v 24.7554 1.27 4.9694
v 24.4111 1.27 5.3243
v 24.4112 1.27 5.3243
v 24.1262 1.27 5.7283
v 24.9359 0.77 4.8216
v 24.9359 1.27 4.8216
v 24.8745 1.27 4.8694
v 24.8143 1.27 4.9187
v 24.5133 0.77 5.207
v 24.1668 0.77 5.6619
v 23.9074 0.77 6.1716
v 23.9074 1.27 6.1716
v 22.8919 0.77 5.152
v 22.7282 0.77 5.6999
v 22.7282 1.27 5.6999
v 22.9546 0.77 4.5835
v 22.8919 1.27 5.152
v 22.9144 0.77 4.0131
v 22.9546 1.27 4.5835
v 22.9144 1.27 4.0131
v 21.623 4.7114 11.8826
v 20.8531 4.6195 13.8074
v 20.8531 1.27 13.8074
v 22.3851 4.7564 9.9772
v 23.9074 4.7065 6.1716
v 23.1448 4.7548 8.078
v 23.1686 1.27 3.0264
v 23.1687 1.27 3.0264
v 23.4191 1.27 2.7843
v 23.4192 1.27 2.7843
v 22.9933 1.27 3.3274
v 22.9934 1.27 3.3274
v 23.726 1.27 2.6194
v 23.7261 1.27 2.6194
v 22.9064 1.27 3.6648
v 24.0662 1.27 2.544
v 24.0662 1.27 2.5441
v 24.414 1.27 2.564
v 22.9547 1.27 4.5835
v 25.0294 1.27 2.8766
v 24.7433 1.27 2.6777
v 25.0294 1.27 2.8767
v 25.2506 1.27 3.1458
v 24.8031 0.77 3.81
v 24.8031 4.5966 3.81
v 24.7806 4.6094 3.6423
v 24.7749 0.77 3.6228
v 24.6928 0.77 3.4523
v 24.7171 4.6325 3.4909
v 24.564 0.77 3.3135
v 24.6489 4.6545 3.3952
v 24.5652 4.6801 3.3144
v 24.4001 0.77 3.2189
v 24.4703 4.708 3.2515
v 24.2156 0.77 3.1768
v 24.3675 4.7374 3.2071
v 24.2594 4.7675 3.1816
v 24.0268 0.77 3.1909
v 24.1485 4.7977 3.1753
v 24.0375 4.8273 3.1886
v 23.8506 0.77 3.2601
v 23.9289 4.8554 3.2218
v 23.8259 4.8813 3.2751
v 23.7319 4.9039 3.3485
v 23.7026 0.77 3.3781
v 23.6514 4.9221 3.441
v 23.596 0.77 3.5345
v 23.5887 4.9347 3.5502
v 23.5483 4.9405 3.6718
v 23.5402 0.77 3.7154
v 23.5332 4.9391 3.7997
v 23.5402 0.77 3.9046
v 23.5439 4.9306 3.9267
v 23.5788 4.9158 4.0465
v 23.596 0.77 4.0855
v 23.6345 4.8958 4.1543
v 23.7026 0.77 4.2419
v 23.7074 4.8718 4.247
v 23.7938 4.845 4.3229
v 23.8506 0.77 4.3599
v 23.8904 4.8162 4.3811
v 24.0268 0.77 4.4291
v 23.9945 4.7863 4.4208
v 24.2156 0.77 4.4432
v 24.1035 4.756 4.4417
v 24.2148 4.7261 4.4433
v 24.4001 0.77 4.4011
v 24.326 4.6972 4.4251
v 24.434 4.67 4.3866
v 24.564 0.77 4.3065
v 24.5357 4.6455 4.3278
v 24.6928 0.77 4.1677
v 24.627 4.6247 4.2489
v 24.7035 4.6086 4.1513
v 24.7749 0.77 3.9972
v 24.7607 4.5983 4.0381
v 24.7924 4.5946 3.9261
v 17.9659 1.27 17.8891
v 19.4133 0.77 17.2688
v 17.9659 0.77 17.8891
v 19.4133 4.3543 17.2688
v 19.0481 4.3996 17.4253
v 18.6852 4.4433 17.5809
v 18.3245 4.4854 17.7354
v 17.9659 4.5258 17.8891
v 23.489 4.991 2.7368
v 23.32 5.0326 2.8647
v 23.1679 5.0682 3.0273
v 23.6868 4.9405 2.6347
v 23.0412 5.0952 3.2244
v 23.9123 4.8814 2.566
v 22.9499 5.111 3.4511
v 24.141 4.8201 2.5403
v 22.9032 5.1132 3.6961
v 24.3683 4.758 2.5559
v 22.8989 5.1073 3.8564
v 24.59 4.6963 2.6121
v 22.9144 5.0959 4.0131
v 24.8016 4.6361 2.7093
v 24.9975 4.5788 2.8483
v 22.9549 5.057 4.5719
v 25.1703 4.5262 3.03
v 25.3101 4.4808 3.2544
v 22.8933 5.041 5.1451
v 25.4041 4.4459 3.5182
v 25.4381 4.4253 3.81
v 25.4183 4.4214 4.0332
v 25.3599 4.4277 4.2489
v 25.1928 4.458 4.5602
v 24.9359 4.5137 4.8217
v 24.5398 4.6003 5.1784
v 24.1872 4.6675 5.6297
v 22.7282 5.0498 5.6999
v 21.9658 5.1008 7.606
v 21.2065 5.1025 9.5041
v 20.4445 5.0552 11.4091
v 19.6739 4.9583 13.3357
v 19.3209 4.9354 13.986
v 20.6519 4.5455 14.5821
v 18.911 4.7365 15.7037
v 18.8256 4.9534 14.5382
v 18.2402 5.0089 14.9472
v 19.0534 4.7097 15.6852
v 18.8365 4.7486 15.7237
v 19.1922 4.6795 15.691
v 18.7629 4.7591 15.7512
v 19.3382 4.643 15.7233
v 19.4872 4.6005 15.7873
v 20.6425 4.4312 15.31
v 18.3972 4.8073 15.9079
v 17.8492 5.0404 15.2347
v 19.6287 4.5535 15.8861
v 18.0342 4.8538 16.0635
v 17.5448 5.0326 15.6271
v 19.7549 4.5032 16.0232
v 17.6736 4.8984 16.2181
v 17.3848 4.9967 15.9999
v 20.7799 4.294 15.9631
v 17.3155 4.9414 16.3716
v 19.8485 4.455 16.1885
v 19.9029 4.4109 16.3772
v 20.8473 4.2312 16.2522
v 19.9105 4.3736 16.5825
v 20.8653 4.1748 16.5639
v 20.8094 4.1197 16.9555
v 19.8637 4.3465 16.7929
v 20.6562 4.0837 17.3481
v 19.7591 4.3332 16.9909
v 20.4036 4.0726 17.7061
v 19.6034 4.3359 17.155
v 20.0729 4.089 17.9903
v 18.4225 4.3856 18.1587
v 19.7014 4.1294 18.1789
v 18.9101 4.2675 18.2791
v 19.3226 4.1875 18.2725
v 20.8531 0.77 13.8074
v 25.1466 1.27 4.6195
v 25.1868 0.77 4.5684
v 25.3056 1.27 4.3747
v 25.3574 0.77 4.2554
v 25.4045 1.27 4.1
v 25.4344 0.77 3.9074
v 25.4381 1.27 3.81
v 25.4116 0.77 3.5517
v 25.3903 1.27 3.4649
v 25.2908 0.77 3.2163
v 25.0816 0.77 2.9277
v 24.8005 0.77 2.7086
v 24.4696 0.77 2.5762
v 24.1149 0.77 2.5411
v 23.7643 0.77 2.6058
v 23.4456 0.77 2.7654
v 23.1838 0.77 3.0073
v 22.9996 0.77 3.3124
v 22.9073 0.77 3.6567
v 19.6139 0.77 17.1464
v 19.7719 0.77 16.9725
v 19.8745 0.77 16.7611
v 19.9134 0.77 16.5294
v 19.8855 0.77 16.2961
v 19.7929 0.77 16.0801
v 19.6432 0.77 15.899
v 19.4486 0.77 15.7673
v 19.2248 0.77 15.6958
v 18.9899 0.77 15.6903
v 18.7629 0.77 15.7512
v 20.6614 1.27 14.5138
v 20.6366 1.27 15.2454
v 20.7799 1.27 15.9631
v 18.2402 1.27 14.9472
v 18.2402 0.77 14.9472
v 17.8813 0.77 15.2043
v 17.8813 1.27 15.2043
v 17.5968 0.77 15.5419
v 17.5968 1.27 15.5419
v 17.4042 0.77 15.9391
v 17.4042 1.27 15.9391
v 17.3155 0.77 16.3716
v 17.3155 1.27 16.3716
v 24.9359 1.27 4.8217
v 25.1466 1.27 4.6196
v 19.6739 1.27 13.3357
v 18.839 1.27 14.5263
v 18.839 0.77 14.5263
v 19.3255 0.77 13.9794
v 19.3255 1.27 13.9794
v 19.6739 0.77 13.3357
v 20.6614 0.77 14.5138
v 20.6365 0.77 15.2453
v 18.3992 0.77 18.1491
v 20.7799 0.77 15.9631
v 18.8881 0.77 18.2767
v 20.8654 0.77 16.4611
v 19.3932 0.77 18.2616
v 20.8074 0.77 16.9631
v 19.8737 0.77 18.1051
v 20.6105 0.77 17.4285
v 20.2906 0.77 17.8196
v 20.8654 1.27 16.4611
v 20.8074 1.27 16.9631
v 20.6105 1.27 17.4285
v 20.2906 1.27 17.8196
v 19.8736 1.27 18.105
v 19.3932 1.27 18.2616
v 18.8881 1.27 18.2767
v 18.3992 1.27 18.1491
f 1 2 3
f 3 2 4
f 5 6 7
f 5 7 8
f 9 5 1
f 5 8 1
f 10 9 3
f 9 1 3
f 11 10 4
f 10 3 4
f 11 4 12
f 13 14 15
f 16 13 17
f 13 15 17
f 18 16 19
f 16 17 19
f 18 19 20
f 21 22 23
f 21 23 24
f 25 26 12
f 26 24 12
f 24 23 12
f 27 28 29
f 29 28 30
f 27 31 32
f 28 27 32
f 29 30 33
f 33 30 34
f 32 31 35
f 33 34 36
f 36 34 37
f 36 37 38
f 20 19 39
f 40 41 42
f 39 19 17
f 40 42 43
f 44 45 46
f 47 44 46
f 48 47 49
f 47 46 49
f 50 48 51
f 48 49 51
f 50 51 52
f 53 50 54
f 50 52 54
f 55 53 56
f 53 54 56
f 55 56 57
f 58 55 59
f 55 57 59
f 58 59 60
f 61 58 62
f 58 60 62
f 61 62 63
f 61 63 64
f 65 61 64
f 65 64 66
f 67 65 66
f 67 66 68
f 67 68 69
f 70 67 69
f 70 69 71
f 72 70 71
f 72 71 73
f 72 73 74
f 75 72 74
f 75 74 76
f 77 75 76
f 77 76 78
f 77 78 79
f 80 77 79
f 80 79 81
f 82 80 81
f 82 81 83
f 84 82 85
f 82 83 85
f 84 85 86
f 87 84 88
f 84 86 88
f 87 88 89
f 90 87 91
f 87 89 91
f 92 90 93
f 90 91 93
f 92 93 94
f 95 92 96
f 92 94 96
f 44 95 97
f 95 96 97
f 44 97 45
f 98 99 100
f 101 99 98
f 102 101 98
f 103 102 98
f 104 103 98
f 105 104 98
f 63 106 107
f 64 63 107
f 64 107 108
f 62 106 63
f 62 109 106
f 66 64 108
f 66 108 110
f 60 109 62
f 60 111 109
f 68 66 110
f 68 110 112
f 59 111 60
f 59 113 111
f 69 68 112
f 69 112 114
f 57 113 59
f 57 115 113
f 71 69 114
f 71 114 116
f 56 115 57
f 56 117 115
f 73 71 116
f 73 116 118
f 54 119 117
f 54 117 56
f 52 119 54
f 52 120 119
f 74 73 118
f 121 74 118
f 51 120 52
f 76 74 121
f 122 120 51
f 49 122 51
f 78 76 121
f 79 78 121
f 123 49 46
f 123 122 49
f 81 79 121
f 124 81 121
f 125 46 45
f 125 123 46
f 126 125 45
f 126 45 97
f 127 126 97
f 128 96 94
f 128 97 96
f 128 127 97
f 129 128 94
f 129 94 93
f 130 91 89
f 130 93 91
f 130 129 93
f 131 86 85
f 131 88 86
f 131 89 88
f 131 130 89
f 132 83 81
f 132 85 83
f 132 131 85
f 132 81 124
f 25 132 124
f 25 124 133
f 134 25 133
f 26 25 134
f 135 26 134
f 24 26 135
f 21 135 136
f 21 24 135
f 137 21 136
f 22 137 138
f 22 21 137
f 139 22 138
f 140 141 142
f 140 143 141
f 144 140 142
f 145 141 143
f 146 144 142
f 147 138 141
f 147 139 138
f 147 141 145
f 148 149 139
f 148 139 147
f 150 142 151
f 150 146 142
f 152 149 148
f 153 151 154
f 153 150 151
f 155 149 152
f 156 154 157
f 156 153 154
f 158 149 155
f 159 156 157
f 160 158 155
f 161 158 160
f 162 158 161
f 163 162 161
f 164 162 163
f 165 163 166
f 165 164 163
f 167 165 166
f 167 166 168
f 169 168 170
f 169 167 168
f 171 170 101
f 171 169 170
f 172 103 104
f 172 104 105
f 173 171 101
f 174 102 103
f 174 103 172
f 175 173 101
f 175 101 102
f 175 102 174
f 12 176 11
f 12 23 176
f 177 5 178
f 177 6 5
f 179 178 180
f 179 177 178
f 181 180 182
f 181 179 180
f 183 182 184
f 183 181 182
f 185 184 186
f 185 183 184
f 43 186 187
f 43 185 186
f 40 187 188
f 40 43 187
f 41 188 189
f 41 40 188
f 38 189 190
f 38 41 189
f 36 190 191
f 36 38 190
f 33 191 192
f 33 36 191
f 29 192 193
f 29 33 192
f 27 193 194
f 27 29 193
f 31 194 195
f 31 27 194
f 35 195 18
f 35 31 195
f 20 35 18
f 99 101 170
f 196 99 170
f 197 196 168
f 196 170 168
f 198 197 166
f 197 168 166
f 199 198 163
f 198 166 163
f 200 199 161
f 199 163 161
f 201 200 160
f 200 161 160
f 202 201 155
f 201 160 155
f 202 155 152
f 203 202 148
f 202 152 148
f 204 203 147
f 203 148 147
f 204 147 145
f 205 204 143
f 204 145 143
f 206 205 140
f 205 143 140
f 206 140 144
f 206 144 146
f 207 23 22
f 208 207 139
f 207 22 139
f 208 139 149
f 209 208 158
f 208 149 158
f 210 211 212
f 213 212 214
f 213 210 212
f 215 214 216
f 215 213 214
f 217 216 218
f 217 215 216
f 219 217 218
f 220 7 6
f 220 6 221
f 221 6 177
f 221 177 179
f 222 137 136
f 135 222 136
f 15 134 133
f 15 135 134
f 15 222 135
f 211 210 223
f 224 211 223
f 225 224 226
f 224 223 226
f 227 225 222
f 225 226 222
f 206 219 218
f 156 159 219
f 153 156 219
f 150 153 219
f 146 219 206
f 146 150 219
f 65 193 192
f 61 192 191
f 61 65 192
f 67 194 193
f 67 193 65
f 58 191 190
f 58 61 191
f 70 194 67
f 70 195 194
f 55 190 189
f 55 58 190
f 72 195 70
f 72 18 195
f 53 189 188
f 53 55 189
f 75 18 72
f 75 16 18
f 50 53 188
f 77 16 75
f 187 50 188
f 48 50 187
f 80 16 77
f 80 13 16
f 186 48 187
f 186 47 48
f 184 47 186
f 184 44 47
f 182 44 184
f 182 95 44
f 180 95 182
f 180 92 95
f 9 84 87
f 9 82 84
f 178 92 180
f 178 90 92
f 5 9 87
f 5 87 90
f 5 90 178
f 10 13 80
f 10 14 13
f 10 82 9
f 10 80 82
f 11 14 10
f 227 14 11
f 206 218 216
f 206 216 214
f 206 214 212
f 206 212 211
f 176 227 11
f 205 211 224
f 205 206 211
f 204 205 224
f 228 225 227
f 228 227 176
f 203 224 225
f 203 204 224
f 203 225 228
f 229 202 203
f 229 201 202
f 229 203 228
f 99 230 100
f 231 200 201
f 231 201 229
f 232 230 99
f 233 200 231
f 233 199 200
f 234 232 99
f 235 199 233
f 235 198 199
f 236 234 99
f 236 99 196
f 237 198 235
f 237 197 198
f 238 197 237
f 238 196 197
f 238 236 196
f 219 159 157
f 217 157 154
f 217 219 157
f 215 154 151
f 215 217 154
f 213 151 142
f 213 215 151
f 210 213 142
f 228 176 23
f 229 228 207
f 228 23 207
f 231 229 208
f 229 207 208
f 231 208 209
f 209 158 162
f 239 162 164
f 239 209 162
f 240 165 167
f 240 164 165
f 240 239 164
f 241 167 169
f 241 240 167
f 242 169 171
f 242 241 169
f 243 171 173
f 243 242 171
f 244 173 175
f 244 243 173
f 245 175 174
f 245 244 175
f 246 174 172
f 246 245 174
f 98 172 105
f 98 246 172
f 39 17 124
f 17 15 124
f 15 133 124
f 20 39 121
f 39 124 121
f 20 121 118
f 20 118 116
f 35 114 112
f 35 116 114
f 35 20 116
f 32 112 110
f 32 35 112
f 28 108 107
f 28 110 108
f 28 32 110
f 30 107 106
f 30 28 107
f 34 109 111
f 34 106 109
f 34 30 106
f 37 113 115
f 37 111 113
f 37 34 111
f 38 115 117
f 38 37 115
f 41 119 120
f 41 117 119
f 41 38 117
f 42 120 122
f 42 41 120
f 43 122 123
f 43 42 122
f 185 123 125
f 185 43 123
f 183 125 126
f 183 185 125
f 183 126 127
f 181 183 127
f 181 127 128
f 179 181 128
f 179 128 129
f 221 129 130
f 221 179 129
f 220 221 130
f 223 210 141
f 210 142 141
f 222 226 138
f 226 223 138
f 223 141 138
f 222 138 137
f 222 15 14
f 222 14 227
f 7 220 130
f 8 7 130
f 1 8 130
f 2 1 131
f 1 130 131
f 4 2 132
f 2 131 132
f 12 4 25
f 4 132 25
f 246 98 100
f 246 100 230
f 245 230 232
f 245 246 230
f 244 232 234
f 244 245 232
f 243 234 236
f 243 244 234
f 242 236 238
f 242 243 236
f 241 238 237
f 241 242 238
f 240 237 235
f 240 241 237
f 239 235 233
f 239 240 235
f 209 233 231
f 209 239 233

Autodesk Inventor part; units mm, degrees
ref_plane "YZ Plane" through (0, 0, 0) normal (1, 0, 0) x (0, 1, 0)
ref_plane "XZ Plane" through (0, 0, 0) normal (0, 1, 0) x (-1, 0, 0)
sketch "Sketch1" plane through (0, 0, 0) normal (0, 0, 1) x (1, 0, 0)
  line L0 (0, 0) -> (0, 8.6646) construction
  line L1 (20.9931, 1.27) -> (20.9931, 5.715)
  line L2 (20.9931, 5.715) -> (27.9781, 3.81)
  line L3 (27.9781, 3.81) -> (27.9781, 0)
  line L4 (27.9781, 0) -> (20.9931, 0)
  line L5 (20.9931, 1.27) -> (18.4531, 1.27)
  line L6 (18.4531, 1.27) -> (18.4531, 0)
  line L7 (18.4531, 0) -> (20.9931, 0)
  dimension "d0" = 20.9931
  dimension "d1" = 4.445
  dimension "d2" = 1.27
  dimension "d3" = 2.54
  dimension "d4" = 3.81
  dimension "d5" = 6.985
revolve "Revolution1" add sketch "Sketch1" angle 360 about axis through (0, 0, 0) along (0, 1, 0)
ref_plane "Work Plane1" through (0, 3.81, 0) normal (0, 1, 0) x (1, 0, 0)
sketch "Sketch2" plane through (0, 0, 0) normal (0, -1, 0) x (1, 0, 0)
  line L0 (0, 0) -> (-45.8206, 0) construction
  circle A0 centre (0, 0) radius 27.9781 projected
  line L1 (-27.6227, 4.445) -> (-30.5181, 2.54)
  line L2 (-30.5181, 2.54) -> (-30.5181, -2.54)
  line L3 (-30.5181, -2.54) -> (-27.6227, -4.445)
  dimension "d7" = 2.54
  dimension "d8" = 8.89
  dimension "d9" = 5.08
extrude "Extrusion1" add sketch "Sketch2" against normal up to surface (3.81 mm away) contours A0 L3 L2 L1
pattern_circular "Circular Pattern1" count 12 over 360 about axis through (0, 1.905, 0) along (0, -1, 0) of "Extrusion1"
sketch "Sketch3" plane through (0, 1.27, 0) normal (0, 1, 0) x (1, 0, 0)
  circle A0 centre (0, 0) radius 18.4531 projected
  circle A1 centre (0, 0) radius 18.4531 projected
  circle A2 centre (0, 0) radius 20.9931 projected
  circle A3 centre (0, 0) radius 20.9931 projected
  arc A4 (-26.1445, 9.9619) -> (-27.6227, 4.445) centre (0, 0) ccw projected
  arc A5 (-27.6227, 4.445) -> (-27.6227, -4.445) centre (0, 0) ccw projected
  arc A6 (-27.6227, -4.445) -> (-26.1445, -9.9619) centre (0, 0) ccw projected
  arc A7 (-26.1445, -9.9619) -> (-21.6995, -17.6609) centre (0, 0) ccw projected
  arc A8 (-21.6995, -17.6609) -> (-17.6609, -21.6995) centre (0, 0) ccw projected
  arc A9 (-17.6609, -21.6995) -> (-9.9619, -26.1445) centre (0, 0) ccw projected
  arc A10 (-9.9619, -26.1445) -> (-4.445, -27.6227) centre (0, 0) ccw projected
  arc A11 (-4.445, -27.6227) -> (4.445, -27.6227) centre (0, 0) ccw projected
  arc A12 (4.445, -27.6227) -> (9.9619, -26.1445) centre (0, 0) ccw projected
  arc A13 (9.9619, -26.1445) -> (17.6609, -21.6995) centre (0, 0) ccw projected
  arc A14 (17.6609, -21.6995) -> (21.6995, -17.6609) centre (0, 0) ccw projected
  arc A15 (21.6995, -17.6609) -> (26.1445, -9.9619) centre (0, 0) ccw projected
  arc A16 (26.1445, -9.9619) -> (27.6227, -4.445) centre (0, 0) ccw projected
  arc A17 (27.6227, -4.445) -> (27.6227, 4.445) centre (0, 0) ccw projected
  arc A18 (27.6227, 4.445) -> (26.1445, 9.9619) centre (0, 0) ccw projected
  arc A19 (26.1445, 9.9619) -> (21.6995, 17.6609) centre (0, 0) ccw projected
  arc A20 (21.6995, 17.6609) -> (17.6609, 21.6995) centre (0, 0) ccw projected
  arc A21 (17.6609, 21.6995) -> (9.9619, 26.1445) centre (0, 0) ccw projected
  arc A22 (9.9619, 26.1445) -> (4.445, 27.6227) centre (0, 0) ccw projected
  arc A23 (4.445, 27.6227) -> (-4.445, 27.6227) centre (0, 0) ccw projected
  arc A24 (-4.445, 27.6227) -> (-9.9619, 26.1445) centre (0, 0) ccw projected
  arc A25 (-9.9619, 26.1445) -> (-17.6609, 21.6995) centre (0, 0) ccw projected
  arc A26 (-17.6609, 21.6995) -> (-21.6995, 17.6609) centre (0, 0) ccw projected
  arc A27 (-21.6995, 17.6609) -> (-26.1445, 9.9619) centre (0, 0) ccw projected
  circle A28 centre (0, 0) radius 22.8981
  spline S0 degree 2 poles (-20.4865, -10.8927) (-20.2314, -10.7347) (-20.0767, -10.9844) knots 0 0 0 1 1 1
  spline S1 degree 2 poles (-20.0767, -10.9844) (-19.9219, -11.2342) (-20.177, -11.3922) knots 0 0 0 1 1 1
  line L0 (-20.177, -11.3922) -> (-22.4984, -12.8306)
  line L1 (-22.4984, -12.8306) -> (-21.0657, -12.8234)
  spline S2 degree 2 poles (-21.0657, -12.8234) (-20.8353, -12.8371) (-20.7343, -13.0001) knots 0 0 0 1 1 1
  spline S3 degree 2 poles (-20.7343, -13.0001) (-20.6366, -13.1578) (-20.7235, -13.3463) knots 0 0 0 1 1 1
  line L2 (-20.7235, -13.3463) -> (-21.4078, -14.6436)
  line L3 (-21.4078, -14.6436) -> (-19.0627, -13.1905)
  spline S4 degree 2 poles (-19.0627, -13.1905) (-18.8077, -13.0325) (-18.6529, -13.2822) knots 0 0 0 1 1 1
  spline S5 degree 2 poles (-18.6529, -13.2822) (-18.4949, -13.5373) (-18.7499, -13.6953) knots 0 0 0 1 1 1
  line L4 (-18.7499, -13.6953) -> (-21.6577, -15.497)
  spline S6 degree 2 poles (-21.6577, -15.497) (-21.9259, -15.6631) (-22.0936, -15.3923) knots 0 0 0 1 1 1
  spline S7 degree 2 poles (-22.0936, -15.3923) (-22.2093, -15.2057) (-22.1246, -15.0076) knots 0 0 0 1 1 1
  line L5 (-22.1246, -15.0076) -> (-21.3965, -13.3994)
  line L6 (-21.3965, -13.3994) -> (-23.1279, -13.3298)
  spline S8 degree 2 poles (-23.1279, -13.3298) (-23.414, -13.3142) (-23.5248, -13.1355) knots 0 0 0 1 1 1
  spline S9 degree 2 poles (-23.5248, -13.1355) (-23.5932, -13.025) (-23.5178, -12.7709) (-23.3942, -12.6944) knots 0 0 0 1 2 2 2
  line L7 (-23.3942, -12.6944) -> (-20.4865, -10.8927)
  line L8 (-21.4115, -8.1592) -> (-20.6563, -9.942)
  line L9 (-20.6563, -9.942) -> (-23.6894, -11.2268)
  line L10 (-23.6894, -11.2268) -> (-24.4445, -9.444)
  spline S10 degree 2 poles (-24.4445, -9.444) (-24.5591, -9.1734) (-24.2914, -9.06) knots 0 0 0 1 1 1
  spline S11 degree 2 poles (-24.2914, -9.06) (-24.0209, -8.9454) (-23.9063, -9.216) knots 0 0 0 1 1 1
  line L11 (-23.9063, -9.216) -> (-23.3743, -10.4719)
  line L12 (-23.3743, -10.4719) -> (-22.8189, -10.2367)
  line L13 (-22.8189, -10.2367) -> (-23.3171, -9.0605)
  spline S12 degree 2 poles (-23.3171, -9.0605) (-23.4293, -8.7956) (-23.1616, -8.6822) knots 0 0 0 1 1 1
  spline S13 degree 2 poles (-23.1616, -8.6822) (-22.8854, -8.5652) (-22.7732, -8.8301) knots 0 0 0 1 1 1
  line L14 (-22.7732, -8.8301) -> (-22.275, -10.0063)
  line L15 (-22.275, -10.0063) -> (-21.4235, -9.6456)
  line L16 (-21.4235, -9.6456) -> (-21.9554, -8.3897)
  spline S14 degree 2 poles (-21.9554, -8.3897) (-22.07, -8.1191) (-21.8023, -8.0057) knots 0 0 0 1 1 1
  spline S15 degree 2 poles (-21.8023, -8.0057) (-21.5261, -7.8887) (-21.4115, -8.1592) knots 0 0 0 1 1 1
  spline S16 degree 2 poles (-22.8056, -5.2377) (-22.4484, -5.3877) (-22.1014, -5.7752) (-22.015, -6.0818) knots 0 0 0 1 2 2 2
  spline S17 degree 2 poles (-22.015, -6.0818) (-21.8732, -6.5849) (-22.313, -7.0655) knots 0 0 0 1 1 1
  spline S18 degree 2 poles (-22.313, -7.0655) (-22.5945, -7.4918) (-23.3387, -7.7016) knots 0 0 0 1 1 1
  spline S19 degree 2 poles (-23.3387, -7.7016) (-24.1544, -7.9314) (-24.69, -7.6614) knots 0 0 0 1 1 1
  spline S20 degree 2 poles (-24.69, -7.6614) (-25.1213, -7.4423) (-25.2479, -6.9928) knots 0 0 0 1 1 1
  spline S21 degree 2 poles (-25.2479, -6.9928) (-25.3444, -6.6505) (-25.2198, -6.1462) (-24.9563, -5.8953) knots 0 0 0 1 2 2 2
  spline S22 degree 2 poles (-24.9563, -5.8953) (-24.9018, -5.8381) (-24.8303, -5.818) knots 0 0 0 1 1 1
  spline S23 degree 2 poles (-24.8303, -5.818) (-24.7112, -5.7844) (-24.4997, -5.908) (-24.4678, -6.0211) knots 0 0 0 1 2 2 2
  spline S24 degree 2 poles (-24.4678, -6.0211) (-24.4242, -6.1759) (-24.5806, -6.3164) knots 0 0 0 1 1 1
  spline S25 degree 2 poles (-24.5806, -6.3164) (-24.7683, -6.517) (-24.6827, -6.8207) knots 0 0 0 1 1 1
  spline S26 degree 2 poles (-24.6827, -6.8207) (-24.6139, -7.0648) (-24.3475, -7.1664) knots 0 0 0 1 1 1
  spline S27 degree 2 poles (-24.3475, -7.1664) (-24.0157, -7.2947) (-23.4948, -7.1479) knots 0 0 0 1 1 1
  spline S28 degree 2 poles (-23.4948, -7.1479) (-23.0095, -7.0111) (-22.5148, -6.4861) (-22.587, -6.2301) knots 0 0 0 1 2 2 2
  spline S29 degree 2 poles (-22.587, -6.2301) (-22.6767, -5.9116) (-22.9983, -5.774) knots 0 0 0 1 1 1
  spline S30 degree 2 poles (-22.9983, -5.774) (-23.1807, -5.7194) (-23.2168, -5.5914) knots 0 0 0 1 1 1
  spline S31 degree 2 poles (-23.2168, -5.5914) (-23.2487, -5.4783) (-23.1196, -5.2523) (-23.0064, -5.2204) knots 0 0 0 1 2 2 2
  spline S32 degree 2 poles (-23.0064, -5.2204) (-22.9082, -5.1928) (-22.8056, -5.2377) knots 0 0 0 1 1 1
  spline S33 degree 2 poles (-23.0841, -2.194) (-22.7873, -2.1504) (-22.7455, -2.435) knots 0 0 0 1 1 1
  spline S34 degree 2 poles (-22.7455, -2.435) (-22.7028, -2.7257) (-22.9996, -2.7693) knots 0 0 0 1 1 1
  line L17 (-22.9996, -2.7693) -> (-24.1563, -2.9392)
  line L18 (-24.1563, -2.9392) -> (-23.9877, -4.0867)
  line L19 (-23.9877, -4.0867) -> (-22.8311, -3.9168)
  spline S35 degree 2 poles (-22.8311, -3.9168) (-22.5342, -3.8732) (-22.4915, -4.1639) knots 0 0 0 1 1 1
  spline S36 degree 2 poles (-22.4915, -4.1639) (-22.4488, -4.4546) (-22.7456, -4.4982) knots 0 0 0 1 1 1
  line L20 (-22.7456, -4.4982) -> (-25.4599, -4.8969)
  spline S37 degree 2 poles (-25.4599, -4.8969) (-25.7536, -4.9401) (-25.7963, -4.6494) knots 0 0 0 1 1 1
  spline S38 degree 2 poles (-25.7963, -4.6494) (-25.839, -4.3587) (-25.5453, -4.3155) knots 0 0 0 1 1 1
  line L21 (-25.5453, -4.3155) -> (-24.5722, -4.1726)
  line L22 (-24.5722, -4.1726) -> (-24.7408, -3.0251)
  line L23 (-24.7408, -3.0251) -> (-25.7139, -3.168)
  spline S39 degree 2 poles (-25.7139, -3.168) (-26.0076, -3.2112) (-26.0503, -2.9205) knots 0 0 0 1 1 1
  spline S40 degree 2 poles (-26.0503, -2.9205) (-26.0921, -2.6359) (-25.7984, -2.5928) knots 0 0 0 1 1 1
  line L24 (-25.7984, -2.5928) -> (-23.0841, -2.194)
  spline S41 degree 2 poles (-23.2836, 1.208) (-23.2064, 1.2364) (-23.1539, 1.2367) knots 0 0 0 1 1 1
  spline S42 degree 2 poles (-23.1539, 1.2367) (-23.0302, 1.2375) (-22.8651, 1.053) (-22.8643, 0.9323) knots 0 0 0 1 2 2 2
  spline S43 degree 2 poles (-22.8643, 0.9323) (-22.8631, 0.7437) (-23.042, 0.6683) knots 0 0 0 1 1 1
  line L25 (-23.042, 0.6683) -> (-23.4523, 0.5049)
  line L26 (-23.4523, 0.5049) -> (-23.4439, -0.8127)
  line L27 (-23.4439, -0.8127) -> (-23.0192, -0.9677)
  spline S44 degree 2 poles (-23.0192, -0.9677) (-22.8518, -1.0347) (-22.8505, -1.2295) knots 0 0 0 1 1 1
  spline S45 degree 2 poles (-22.8505, -1.2295) (-22.8498, -1.3439) (-23.0064, -1.5305) (-23.1301, -1.5313) knots 0 0 0 1 2 2 2
  spline S46 degree 2 poles (-23.1301, -1.5313) (-23.1826, -1.5316) (-23.2322, -1.5134) knots 0 0 0 1 1 1
  line L28 (-23.2322, -1.5134) -> (-26.0565, -0.4767)
  spline S47 degree 2 poles (-26.0565, -0.4767) (-26.2212, -0.3571) (-26.2222, -0.1963) knots 0 0 0 1 1 1
  spline S48 degree 2 poles (-26.2222, -0.1963) (-26.2233, -0.0262) (-26.0632, 0.0924) knots 0 0 0 1 1 1
  line L29 (-26.0632, 0.0924) -> (-23.2836, 1.208)
  line L30 (-24.0233, 0.3126) -> (-25.2852, -0.1749)
  line L31 (-25.2852, -0.1749) -> (-24.0173, -0.6307)
  line L32 (-24.0173, -0.6307) -> (-24.0233, 0.3126)
  spline S49 degree 2 poles (-22.7917, 4.2665) (-22.4883, 4.2255) (-22.5223, 3.9742) knots 0 0 0 1 1 1
  spline S50 degree 2 poles (-22.5223, 3.9742) (-22.5451, 3.8056) (-22.7963, 3.7022) knots 0 0 0 1 1 1
  line L33 (-22.7963, 3.7022) -> (-24.9996, 2.6644)
  line L34 (-24.9996, 2.6644) -> (-23.038, 2.3991)
  spline S51 degree 2 poles (-23.038, 2.3991) (-22.7407, 2.3589) (-22.7793, 2.0739) knots 0 0 0 1 1 1
  spline S52 degree 2 poles (-22.7793, 2.0739) (-22.8178, 1.7888) (-23.1151, 1.8291) knots 0 0 0 1 1 1
  line L35 (-23.1151, 1.8291) -> (-25.8582, 2.2)
  spline S53 degree 2 poles (-25.8582, 2.2) (-26.1463, 2.239) (-26.109, 2.5148) knots 0 0 0 1 1 1
  spline S54 degree 2 poles (-26.109, 2.5148) (-26.0867, 2.6803) (-25.9475, 2.6709) knots 0 0 0 1 1 1
  line L36 (-25.9475, 2.6709) -> (-23.6718, 3.805)
  line L37 (-23.6718, 3.805) -> (-25.5813, 4.0632)
  spline S55 degree 2 poles (-25.5813, 4.0632) (-25.8755, 4.103) (-25.837, 4.3881) knots 0 0 0 1 1 1
  spline S56 degree 2 poles (-25.837, 4.3881) (-25.7984, 4.6731) (-25.5042, 4.6333) knots 0 0 0 1 1 1
  line L38 (-25.5042, 4.6333) -> (-22.7917, 4.2665)
  spline S57 degree 2 poles (-22.4654, 5.6266) (-22.1736, 5.5569) (-22.2419, 5.2711) knots 0 0 0 1 1 1
  spline S58 degree 2 poles (-22.2419, 5.2711) (-22.3101, 4.9853) (-22.6019, 5.055) knots 0 0 0 1 1 1
  line L39 (-22.6019, 5.055) -> (-25.2702, 5.6925)
  spline S59 degree 2 poles (-25.2702, 5.6925) (-25.559, 5.7615) (-25.4907, 6.0473) knots 0 0 0 1 1 1
  spline S60 degree 2 poles (-25.4907, 6.0473) (-25.4224, 6.3331) (-25.1336, 6.2641) knots 0 0 0 1 1 1
  line L40 (-25.1336, 6.2641) -> (-22.4654, 5.6266)
  spline S61 degree 2 poles (-21.7348, 8.6674) (-21.5264, 8.3409) (-21.4615, 7.8248) (-21.5649, 7.5235) knots 0 0 0 1 2 2 2
  spline S62 degree 2 poles (-21.5649, 7.5235) (-21.7346, 7.0291) (-22.3696, 6.8841) knots 0 0 0 1 1 1
  spline S63 degree 2 poles (-22.3696, 6.8841) (-22.8437, 6.6936) (-23.5751, 6.9445) knots 0 0 0 1 1 1
  spline S64 degree 2 poles (-23.5751, 6.9445) (-24.3766, 7.2196) (-24.6635, 7.7463) knots 0 0 0 1 1 1
  spline S65 degree 2 poles (-24.6635, 7.7463) (-24.8935, 8.1719) (-24.7419, 8.6136) knots 0 0 0 1 1 1
  spline S66 degree 2 poles (-24.7419, 8.6136) (-24.6265, 8.95) (-24.2371, 9.2938) (-23.8777, 9.3503) knots 0 0 0 1 2 2 2
  spline S67 degree 2 poles (-23.8777, 9.3503) (-23.8003, 9.3663) (-23.7301, 9.3422) knots 0 0 0 1 1 1
  spline S68 degree 2 poles (-23.7301, 9.3422) (-23.6131, 9.3021) (-23.5094, 9.0801) (-23.5475, 8.9689) knots 0 0 0 1 2 2 2
  spline S69 degree 2 poles (-23.5475, 8.9689) (-23.5997, 8.8168) (-23.8083, 8.7903) knots 0 0 0 1 1 1
  spline S70 degree 2 poles (-23.8083, 8.7903) (-24.0768, 8.732) (-24.1792, 8.4336) knots 0 0 0 1 1 1
  spline S71 degree 2 poles (-24.1792, 8.4336) (-24.2615, 8.1937) (-24.1002, 7.9585) knots 0 0 0 1 1 1
  spline S72 degree 2 poles (-24.1002, 7.9585) (-23.9003, 7.6643) (-23.3884, 7.4887) knots 0 0 0 1 1 1
  spline S73 degree 2 poles (-23.3884, 7.4887) (-22.9115, 7.3251) (-22.206, 7.4754) (-22.1197, 7.7269) knots 0 0 0 1 2 2 2
  spline S74 degree 2 poles (-22.1197, 7.7269) (-22.0123, 8.04) (-22.1984, 8.336) knots 0 0 0 1 1 1
  spline S75 degree 2 poles (-22.1984, 8.336) (-22.3174, 8.4847) (-22.2743, 8.6105) knots 0 0 0 1 1 1
  spline S76 degree 2 poles (-22.2743, 8.6105) (-22.2361, 8.7217) (-22.0014, 8.8341) (-21.8902, 8.7959) knots 0 0 0 1 2 2 2
  spline S77 degree 2 poles (-21.8902, 8.7959) (-21.7937, 8.7628) (-21.7348, 8.6674) knots 0 0 0 1 1 1
  spline S78 degree 2 poles (-20.1702, 11.694) (-20.0886, 11.684) (-20.0417, 11.6603) knots 0 0 0 1 1 1
  spline S79 degree 2 poles (-20.0417, 11.6603) (-19.9312, 11.6046) (-19.8684, 11.3651) (-19.9228, 11.2574) knots 0 0 0 1 2 2 2
  spline S80 degree 2 poles (-19.9228, 11.2574) (-20.0077, 11.0889) (-20.2013, 11.1035) knots 0 0 0 1 1 1
  line L41 (-20.2013, 11.1035) -> (-20.641, 11.1451)
  line L42 (-20.641, 11.1451) -> (-21.2344, 9.9688)
  line L43 (-21.2344, 9.9688) -> (-20.9272, 9.6371)
  spline S81 degree 2 poles (-20.9272, 9.6371) (-20.8087, 9.5011) (-20.8965, 9.3272) knots 0 0 0 1 1 1
  spline S82 degree 2 poles (-20.8965, 9.3272) (-20.948, 9.225) (-21.1724, 9.1304) (-21.2829, 9.1861) knots 0 0 0 1 2 2 2
  spline S83 degree 2 poles (-21.2829, 9.1861) (-21.3298, 9.2098) (-21.3656, 9.2486) knots 0 0 0 1 1 1
  line L44 (-21.3656, 9.2486) -> (-23.4063, 11.4593)
  spline S84 degree 2 poles (-23.4063, 11.4593) (-23.4983, 11.6408) (-23.4258, 11.7844) knots 0 0 0 1 1 1
  spline S85 degree 2 poles (-23.4258, 11.7844) (-23.3492, 11.9363) (-23.1527, 11.9688) knots 0 0 0 1 1 1
  line L45 (-23.1527, 11.9688) -> (-20.1702, 11.694)
  line L46 (-21.2369, 11.2344) -> (-22.5822, 11.3761)
  line L47 (-22.5822, 11.3761) -> (-21.6617, 10.3922)
  line L48 (-21.6617, 10.3922) -> (-21.2369, 11.2344)
  line L49 (-18.3775, 13.6927) -> (-19.469, 12.0936)
  line L50 (-19.469, 12.0936) -> (-21.9443, 13.7831)
  spline S86 degree 2 poles (-21.9443, 13.7831) (-22.1896, 13.9505) (-22.0274, 14.188) knots 0 0 0 1 1 1
  spline S87 degree 2 poles (-22.0274, 14.188) (-21.867, 14.4231) (-21.6218, 14.2557) knots 0 0 0 1 1 1
  line L51 (-21.6218, 14.2557) -> (-19.6343, 12.8992)
  line L52 (-19.6343, 12.8992) -> (-18.8654, 14.0258)
  spline S88 degree 2 poles (-18.8654, 14.0258) (-18.6998, 14.2684) (-18.4597, 14.1045) knots 0 0 0 1 1 1
  spline S89 degree 2 poles (-18.4597, 14.1045) (-18.2119, 13.9354) (-18.3775, 13.6927) knots 0 0 0 1 1 1
  dimension "d16" = 1.905
extrude "Extrusion2" cut sketch "Sketch3" along normal blind 25.4 contours S5 L4 S6 S7 L5 L6 S8 S9 L7 S0 A28 S1 L0 L1 S2 S3 L2 L3 S4 | L8 L9 L10 S10 S11 L11 L12 L13 S12 S13 L14 L15 L16 S14 S15 | L49 L50 S86 S87 L51 L52 S88 S89 | A28 S0 S1 | S79 S80 A28 | A28 S80 L41 L42 L43 S81 S82 S83 L44 S84 S85 L45 S78 S79 | S17 S18 S19 S20 S21 S22 S23 S24 S25 S26 S27 S28 S29 S30 S31 S32 S16 A28 | A28 S16 S17 | S81 S82 A28 | S36 L20 S37 S38 L21 L22 L23 S39 S40 L24 S33 A28 S34 L17 L18 L19 S35 | A28 S35 S36 | S61 S62 A28 | A28 S62 S63 S64 S65 S66 S67 S68 S69 S70 S71 S72 S73 S74 S75 S76 S77 S61 | A28 S33 S34 | S57 S58 A28 | A28 S58 L39 S59 S60 L40 S57 | S45 S46 L28 S47 S48 L29 S41 S42 A28 S43 L25 L26 L27 S44 | A28 S44 S45 | S49 S50 A28 | A28 S50 L33 L34 S51 S52 L35 S53 S54 L36 L37 S55 S56 L38 S49 | A28 S42 S43 | S51 S52 A28
sketch "Sketch4" plane through (0, 1.27, 0) normal (0, 1, 0) x (1, 0, 0)
  line L0 (-22.7963, 3.7022) -> (-24.9996, 2.6644) projected
  line L1 (-24.9996, 2.6644) -> (-23.038, 2.3991) projected
  line L2 (-23.1151, 1.8291) -> (-25.8582, 2.2) projected
  line L3 (-25.9475, 2.6709) -> (-23.6718, 3.805) projected
  line L4 (-23.6718, 3.805) -> (-25.5813, 4.0632) projected
  line L5 (-25.5042, 4.6333) -> (-22.7917, 4.2665) projected
  line L6 (-23.042, 0.6683) -> (-23.4523, 0.5049) projected
  line L7 (-23.4523, 0.5049) -> (-23.4439, -0.8127) projected
  line L8 (-23.4439, -0.8127) -> (-23.0192, -0.9677) projected
  line L9 (-23.2322, -1.5134) -> (-26.0565, -0.4767) projected
  line L10 (-26.0632, 0.0924) -> (-23.2836, 1.208) projected
  line L11 (-20.177, -11.3922) -> (-22.4984, -12.8306) projected
  line L12 (-22.4984, -12.8306) -> (-21.0657, -12.8234) projected
  line L13 (-20.7235, -13.3463) -> (-21.4078, -14.6436) projected
  line L14 (-21.4078, -14.6436) -> (-19.0627, -13.1905) projected
  line L15 (-18.7499, -13.6953) -> (-21.6577, -15.497) projected
  line L16 (-22.1246, -15.0076) -> (-21.3965, -13.3994) projected
  line L17 (-21.3965, -13.3994) -> (-23.1279, -13.3298) projected
  line L18 (-23.3942, -12.6944) -> (-20.4865, -10.8927) projected
  line L19 (-20.6563, -9.942) -> (-23.6894, -11.2268) projected
  line L20 (-23.6894, -11.2268) -> (-24.4445, -9.444) projected
  line L21 (-23.9063, -9.216) -> (-23.3743, -10.4719) projected
  line L22 (-23.3743, -10.4719) -> (-22.8189, -10.2367) projected
  line L23 (-22.8189, -10.2367) -> (-23.3171, -9.0605) projected
  line L24 (-22.7732, -8.8301) -> (-22.275, -10.0063) projected
  line L25 (-22.275, -10.0063) -> (-21.4235, -9.6456) projected
  line L26 (-21.4235, -9.6456) -> (-21.9554, -8.3897) projected
  line L27 (-21.4115, -8.1592) -> (-20.6563, -9.942) projected
  line L28 (-22.9996, -2.7693) -> (-24.1563, -2.9392) projected
  line L29 (-24.1563, -2.9392) -> (-23.9877, -4.0867) projected
  line L30 (-23.9877, -4.0867) -> (-22.8311, -3.9168) projected
  line L31 (-22.7456, -4.4982) -> (-25.4599, -4.8969) projected
  line L32 (-25.5453, -4.3155) -> (-24.5722, -4.1726) projected
  line L33 (-24.5722, -4.1726) -> (-24.7408, -3.0251) projected
  line L34 (-24.7408, -3.0251) -> (-25.7139, -3.168) projected
  line L35 (-25.7984, -2.5928) -> (-23.0841, -2.194) projected
  line L36 (-22.6019, 5.055) -> (-25.2702, 5.6925) projected
  line L37 (-25.1336, 6.2641) -> (-22.4654, 5.6266) projected
  line L38 (-20.2013, 11.1035) -> (-20.641, 11.1451) projected
  line L39 (-20.641, 11.1451) -> (-21.2344, 9.9688) projected
  line L40 (-21.2344, 9.9688) -> (-20.9272, 9.6371) projected
  line L41 (-21.3656, 9.2486) -> (-23.4063, 11.4593) projected
  line L42 (-23.1527, 11.9688) -> (-20.1702, 11.694) projected
  line L43 (-19.469, 12.0936) -> (-21.9443, 13.7831) projected
  line L44 (-21.6218, 14.2557) -> (-19.6343, 12.8992) projected
  line L45 (-19.6343, 12.8992) -> (-18.8654, 14.0258) projected
  line L46 (-18.3775, 13.6927) -> (-19.469, 12.0936) projected
  circle A0 centre (0, 0) radius 20.9931 projected
  arc A1 (-26.1445, 9.9619) -> (-27.6227, 4.445) centre (0, 0) ccw projected
  arc A2 (-27.6227, 4.445) -> (-27.6227, -4.445) centre (0, 0) ccw projected
  arc A3 (-27.6227, -4.445) -> (-26.1445, -9.9619) centre (0, 0) ccw projected
  arc A4 (-26.1445, -9.9619) -> (-21.6995, -17.6609) centre (0, 0) ccw projected
  arc A5 (-21.6995, -17.6609) -> (-17.6609, -21.6995) centre (0, 0) ccw projected
  arc A6 (-17.6609, -21.6995) -> (-9.9619, -26.1445) centre (0, 0) ccw projected
  arc A7 (-9.9619, -26.1445) -> (-4.445, -27.6227) centre (0, 0) ccw projected
  arc A8 (-4.445, -27.6227) -> (4.445, -27.6227) centre (0, 0) ccw projected
  arc A9 (4.445, -27.6227) -> (9.9619, -26.1445) centre (0, 0) ccw projected
  arc A10 (9.9619, -26.1445) -> (17.6609, -21.6995) centre (0, 0) ccw projected
  arc A11 (17.6609, -21.6995) -> (21.6995, -17.6609) centre (0, 0) ccw projected
  arc A12 (21.6995, -17.6609) -> (26.1445, -9.9619) centre (0, 0) ccw projected
  arc A13 (26.1445, -9.9619) -> (27.6227, -4.445) centre (0, 0) ccw projected
  arc A14 (27.6227, -4.445) -> (27.6227, 4.445) centre (0, 0) ccw projected
  arc A15 (27.6227, 4.445) -> (26.1445, 9.9619) centre (0, 0) ccw projected
  arc A16 (26.1445, 9.9619) -> (21.6995, 17.6609) centre (0, 0) ccw projected
  arc A17 (21.6995, 17.6609) -> (17.6609, 21.6995) centre (0, 0) ccw projected
  arc A18 (17.6609, 21.6995) -> (9.9619, 26.1445) centre (0, 0) ccw projected
  arc A19 (9.9619, 26.1445) -> (4.445, 27.6227) centre (0, 0) ccw projected
  arc A20 (4.445, 27.6227) -> (-4.445, 27.6227) centre (0, 0) ccw projected
  arc A21 (-4.445, 27.6227) -> (-9.9619, 26.1445) centre (0, 0) ccw projected
  arc A22 (-9.9619, 26.1445) -> (-17.6609, 21.6995) centre (0, 0) ccw projected
  arc A23 (-17.6609, 21.6995) -> (-21.6995, 17.6609) centre (0, 0) ccw projected
  arc A24 (-21.6995, 17.6609) -> (-26.1445, 9.9619) centre (0, 0) ccw projected
  circle A25 centre (0, 0) radius 18.4531 projected
  circle A26 centre (0, 0) radius 20.9931 projected
  circle A27 centre (24.1681, -3.81) radius 1.27
  circle A28 centre (24.1681, -3.81) radius 0.635
  line L47 (30.5181, 2.54) -> (30.5181, -2.54) projected
  arc A29 (17.9659, -17.8891) -> (17.3155, -16.3716) centre (19.0881, -16.51) ccw
  line L48 (19.0881, -16.51) -> (15.2571, -18.1519) construction
  line L49 (18.7629, -15.7512) -> (17.3155, -16.3716)
  line L50 (17.9659, -17.8891) -> (19.4133, -17.2688)
  arc A30 (19.4133, -17.2688) -> (18.7629, -15.7512) centre (19.0881, -16.51) ccw
  line L51 (19.0881, -16.51) -> (24.1681, -3.81) construction
  line L52 (19.1153, -14.7322) -> (23.17, -4.5954)
  line L53 (20.2945, -15.2039) -> (24.3492, -5.067)
  line L54 (0, 0) -> (36.9495, 0) construction
  arc A31 (26.1445, 9.9619) -> (21.6995, 17.6609) centre (0, 0) ccw
  arc A32 (27.6227, 4.445) -> (26.1445, 9.9619) centre (0, 0) ccw
  circle A33 centre (24.1681, 3.81) radius 1.27
  circle A34 centre (24.1681, 3.81) radius 0.635
  arc A35 (17.3155, 16.3716) -> (17.9659, 17.8891) centre (19.0881, 16.51) ccw
  line L55 (19.0881, 16.51) -> (15.2571, 18.1519) construction
  line L56 (18.7629, 15.7512) -> (17.3155, 16.3716)
  line L57 (17.9659, 17.8891) -> (19.4133, 17.2688)
  arc A36 (18.7629, 15.7512) -> (19.4133, 17.2688) centre (19.0881, 16.51) ccw
  line L58 (19.0881, 16.51) -> (24.1681, 3.81) construction
  line L59 (19.1153, 14.7322) -> (23.17, 4.5954)
  line L60 (20.2945, 15.2039) -> (24.3492, 5.067)
  point P0 (-21.5649, 7.5235)
  point P1 (-22.3696, 6.8841)
  point P2 (-23.5751, 6.9445)
  point P3 (-24.6635, 7.7463)
  point P4 (-24.7419, 8.6136)
  point P5 (-23.8777, 9.3503)
  point P6 (-23.7301, 9.3422)
  point P7 (-23.5475, 8.9689)
  point P8 (-23.8083, 8.7903)
  point P9 (-24.1792, 8.4336)
  point P10 (-24.1002, 7.9585)
  point P11 (-23.3884, 7.4887)
  point P12 (-22.1197, 7.7269)
  point P13 (-22.1984, 8.336)
  point P14 (-22.2743, 8.6105)
  point P15 (-21.8902, 8.7959)
  point P16 (-21.7348, 8.6674)
  point P17 (-22.5223, 3.9742)
  point P18 (-22.7793, 2.0739)
  point P19 (-26.109, 2.5148)
  point P20 (-25.837, 4.3881)
  point P21 (-23.1539, 1.2367)
  point P22 (-22.8643, 0.9323)
  point P23 (-22.8505, -1.2295)
  point P24 (-23.1301, -1.5313)
  point P25 (-26.2222, -0.1963)
  point P26 (-22.015, -6.0818)
  point P27 (-22.313, -7.0655)
  point P28 (-23.3387, -7.7016)
  point P29 (-24.69, -7.6614)
  point P30 (-25.2479, -6.9928)
  point P31 (-24.9563, -5.8953)
  point P32 (-24.8303, -5.818)
  point P33 (-24.4678, -6.0211)
  point P34 (-24.5806, -6.3164)
  point P35 (-24.6827, -6.8207)
  point P36 (-24.3475, -7.1664)
  point P37 (-23.4948, -7.1479)
  point P38 (-22.587, -6.2301)
  point P39 (-22.9983, -5.774)
  point P40 (-23.2168, -5.5914)
  point P41 (-23.0064, -5.2204)
  point P42 (-22.8056, -5.2377)
  point P43 (-20.0767, -10.9844)
  point P44 (-20.7343, -13.0001)
  point P45 (-18.6529, -13.2822)
  point P46 (-22.0936, -15.3923)
  point P47 (-23.5248, -13.1355)
  point P48 (-24.2914, -9.06)
  point P49 (-23.1616, -8.6822)
  point P50 (-21.8023, -8.0057)
  point P51 (-22.7455, -2.435)
  point P52 (-22.4915, -4.1639)
  point P53 (-25.7963, -4.6494)
  point P54 (-26.0503, -2.9205)
  point P55 (-22.2419, 5.2711)
  point P56 (-25.4907, 6.0473)
  point P57 (-20.0417, 11.6603)
  point P58 (-19.9228, 11.2574)
  point P59 (-20.8965, 9.3272)
  point P60 (-21.2829, 9.1861)
  point P61 (-23.4258, 11.7844)
  point P62 (-22.0274, 14.188)
  point P63 (-18.4597, 14.1045)
  point P64 (17.1726, -17.3309)
  point P65 (17.1726, 17.3309)
  dimension "d19" = 2.54
  dimension "d20" = 0.635
  dimension "d22" = 3.81
  dimension "d23" = 6.35
  dimension "d24" = 3.556
  dimension "d25" = 135
  dimension "d26" = 1.27
  dimension "d27" = 0.635
  dimension "d28" = 12.7
  dimension "d29" = 5.08
  dimension "d30" = 1.651
extrude "Extrusion3" cut sketch "Sketch4" along normal through all contours A27 | A27 L53 A29 L52 | A29 L50 A30 L49 keep common part
fillet "Fillet1" radius 3.175 4 edges at (19.1153, 3.0642, 14.7322) (20.2945, 2.8973, 15.2039) (23.17, 3.1341, 4.5954) (24.3492, 2.9637, 5.067)
sketch "Sketch5" plane through (0, 1.27, 0) normal (0, -1, 0) x (1, 0, 0)
  circle A0 centre (24.1681, 3.81) radius 0.635 projected
  arc A1 (23.9074, 6.1716) -> (24.9359, 4.8216) centre (26.8553, 7.3508) ccw projected
  line L0 (20.8531, 13.8074) -> (23.9074, 6.1716) projected
  arc A2 (20.7799, 15.9631) -> (20.8531, 13.8074) centre (23.801, 14.9865) ccw projected
  arc A3 (20.7799, 15.9631) -> (17.9659, 17.8891) centre (19.0881, 16.51) ccw projected
  line L1 (19.4133, 17.2688) -> (17.9659, 17.8891) projected
  arc A4 (18.7629, 15.7512) -> (19.4133, 17.2688) centre (19.0881, 16.51) ccw projected
  line L2 (17.3155, 16.3716) -> (18.7629, 15.7512) projected
  arc A5 (17.3155, 16.3716) -> (18.2402, 14.9472) centre (19.0881, 16.51) ccw projected
  arc A6 (19.6739, 13.3357) -> (18.2402, 14.9472) centre (16.726, 12.1565) ccw projected
  line L3 (22.7282, 5.6999) -> (19.6739, 13.3357) projected
  arc A7 (22.9144, 4.0131) -> (22.7282, 5.6999) centre (19.7803, 4.5208) ccw projected
  arc A8 (22.9144, 4.0131) -> (24.9359, 4.8216) centre (24.1681, 3.81) ccw projected
  point P0 (0, 0)
extrude "Extrusion4" add sketch "Sketch5" along normal blind 0.5
equation "\"d27\" = 0.5 * d26"
properties part number "Team Pin Mechanical-Left Wrench"
